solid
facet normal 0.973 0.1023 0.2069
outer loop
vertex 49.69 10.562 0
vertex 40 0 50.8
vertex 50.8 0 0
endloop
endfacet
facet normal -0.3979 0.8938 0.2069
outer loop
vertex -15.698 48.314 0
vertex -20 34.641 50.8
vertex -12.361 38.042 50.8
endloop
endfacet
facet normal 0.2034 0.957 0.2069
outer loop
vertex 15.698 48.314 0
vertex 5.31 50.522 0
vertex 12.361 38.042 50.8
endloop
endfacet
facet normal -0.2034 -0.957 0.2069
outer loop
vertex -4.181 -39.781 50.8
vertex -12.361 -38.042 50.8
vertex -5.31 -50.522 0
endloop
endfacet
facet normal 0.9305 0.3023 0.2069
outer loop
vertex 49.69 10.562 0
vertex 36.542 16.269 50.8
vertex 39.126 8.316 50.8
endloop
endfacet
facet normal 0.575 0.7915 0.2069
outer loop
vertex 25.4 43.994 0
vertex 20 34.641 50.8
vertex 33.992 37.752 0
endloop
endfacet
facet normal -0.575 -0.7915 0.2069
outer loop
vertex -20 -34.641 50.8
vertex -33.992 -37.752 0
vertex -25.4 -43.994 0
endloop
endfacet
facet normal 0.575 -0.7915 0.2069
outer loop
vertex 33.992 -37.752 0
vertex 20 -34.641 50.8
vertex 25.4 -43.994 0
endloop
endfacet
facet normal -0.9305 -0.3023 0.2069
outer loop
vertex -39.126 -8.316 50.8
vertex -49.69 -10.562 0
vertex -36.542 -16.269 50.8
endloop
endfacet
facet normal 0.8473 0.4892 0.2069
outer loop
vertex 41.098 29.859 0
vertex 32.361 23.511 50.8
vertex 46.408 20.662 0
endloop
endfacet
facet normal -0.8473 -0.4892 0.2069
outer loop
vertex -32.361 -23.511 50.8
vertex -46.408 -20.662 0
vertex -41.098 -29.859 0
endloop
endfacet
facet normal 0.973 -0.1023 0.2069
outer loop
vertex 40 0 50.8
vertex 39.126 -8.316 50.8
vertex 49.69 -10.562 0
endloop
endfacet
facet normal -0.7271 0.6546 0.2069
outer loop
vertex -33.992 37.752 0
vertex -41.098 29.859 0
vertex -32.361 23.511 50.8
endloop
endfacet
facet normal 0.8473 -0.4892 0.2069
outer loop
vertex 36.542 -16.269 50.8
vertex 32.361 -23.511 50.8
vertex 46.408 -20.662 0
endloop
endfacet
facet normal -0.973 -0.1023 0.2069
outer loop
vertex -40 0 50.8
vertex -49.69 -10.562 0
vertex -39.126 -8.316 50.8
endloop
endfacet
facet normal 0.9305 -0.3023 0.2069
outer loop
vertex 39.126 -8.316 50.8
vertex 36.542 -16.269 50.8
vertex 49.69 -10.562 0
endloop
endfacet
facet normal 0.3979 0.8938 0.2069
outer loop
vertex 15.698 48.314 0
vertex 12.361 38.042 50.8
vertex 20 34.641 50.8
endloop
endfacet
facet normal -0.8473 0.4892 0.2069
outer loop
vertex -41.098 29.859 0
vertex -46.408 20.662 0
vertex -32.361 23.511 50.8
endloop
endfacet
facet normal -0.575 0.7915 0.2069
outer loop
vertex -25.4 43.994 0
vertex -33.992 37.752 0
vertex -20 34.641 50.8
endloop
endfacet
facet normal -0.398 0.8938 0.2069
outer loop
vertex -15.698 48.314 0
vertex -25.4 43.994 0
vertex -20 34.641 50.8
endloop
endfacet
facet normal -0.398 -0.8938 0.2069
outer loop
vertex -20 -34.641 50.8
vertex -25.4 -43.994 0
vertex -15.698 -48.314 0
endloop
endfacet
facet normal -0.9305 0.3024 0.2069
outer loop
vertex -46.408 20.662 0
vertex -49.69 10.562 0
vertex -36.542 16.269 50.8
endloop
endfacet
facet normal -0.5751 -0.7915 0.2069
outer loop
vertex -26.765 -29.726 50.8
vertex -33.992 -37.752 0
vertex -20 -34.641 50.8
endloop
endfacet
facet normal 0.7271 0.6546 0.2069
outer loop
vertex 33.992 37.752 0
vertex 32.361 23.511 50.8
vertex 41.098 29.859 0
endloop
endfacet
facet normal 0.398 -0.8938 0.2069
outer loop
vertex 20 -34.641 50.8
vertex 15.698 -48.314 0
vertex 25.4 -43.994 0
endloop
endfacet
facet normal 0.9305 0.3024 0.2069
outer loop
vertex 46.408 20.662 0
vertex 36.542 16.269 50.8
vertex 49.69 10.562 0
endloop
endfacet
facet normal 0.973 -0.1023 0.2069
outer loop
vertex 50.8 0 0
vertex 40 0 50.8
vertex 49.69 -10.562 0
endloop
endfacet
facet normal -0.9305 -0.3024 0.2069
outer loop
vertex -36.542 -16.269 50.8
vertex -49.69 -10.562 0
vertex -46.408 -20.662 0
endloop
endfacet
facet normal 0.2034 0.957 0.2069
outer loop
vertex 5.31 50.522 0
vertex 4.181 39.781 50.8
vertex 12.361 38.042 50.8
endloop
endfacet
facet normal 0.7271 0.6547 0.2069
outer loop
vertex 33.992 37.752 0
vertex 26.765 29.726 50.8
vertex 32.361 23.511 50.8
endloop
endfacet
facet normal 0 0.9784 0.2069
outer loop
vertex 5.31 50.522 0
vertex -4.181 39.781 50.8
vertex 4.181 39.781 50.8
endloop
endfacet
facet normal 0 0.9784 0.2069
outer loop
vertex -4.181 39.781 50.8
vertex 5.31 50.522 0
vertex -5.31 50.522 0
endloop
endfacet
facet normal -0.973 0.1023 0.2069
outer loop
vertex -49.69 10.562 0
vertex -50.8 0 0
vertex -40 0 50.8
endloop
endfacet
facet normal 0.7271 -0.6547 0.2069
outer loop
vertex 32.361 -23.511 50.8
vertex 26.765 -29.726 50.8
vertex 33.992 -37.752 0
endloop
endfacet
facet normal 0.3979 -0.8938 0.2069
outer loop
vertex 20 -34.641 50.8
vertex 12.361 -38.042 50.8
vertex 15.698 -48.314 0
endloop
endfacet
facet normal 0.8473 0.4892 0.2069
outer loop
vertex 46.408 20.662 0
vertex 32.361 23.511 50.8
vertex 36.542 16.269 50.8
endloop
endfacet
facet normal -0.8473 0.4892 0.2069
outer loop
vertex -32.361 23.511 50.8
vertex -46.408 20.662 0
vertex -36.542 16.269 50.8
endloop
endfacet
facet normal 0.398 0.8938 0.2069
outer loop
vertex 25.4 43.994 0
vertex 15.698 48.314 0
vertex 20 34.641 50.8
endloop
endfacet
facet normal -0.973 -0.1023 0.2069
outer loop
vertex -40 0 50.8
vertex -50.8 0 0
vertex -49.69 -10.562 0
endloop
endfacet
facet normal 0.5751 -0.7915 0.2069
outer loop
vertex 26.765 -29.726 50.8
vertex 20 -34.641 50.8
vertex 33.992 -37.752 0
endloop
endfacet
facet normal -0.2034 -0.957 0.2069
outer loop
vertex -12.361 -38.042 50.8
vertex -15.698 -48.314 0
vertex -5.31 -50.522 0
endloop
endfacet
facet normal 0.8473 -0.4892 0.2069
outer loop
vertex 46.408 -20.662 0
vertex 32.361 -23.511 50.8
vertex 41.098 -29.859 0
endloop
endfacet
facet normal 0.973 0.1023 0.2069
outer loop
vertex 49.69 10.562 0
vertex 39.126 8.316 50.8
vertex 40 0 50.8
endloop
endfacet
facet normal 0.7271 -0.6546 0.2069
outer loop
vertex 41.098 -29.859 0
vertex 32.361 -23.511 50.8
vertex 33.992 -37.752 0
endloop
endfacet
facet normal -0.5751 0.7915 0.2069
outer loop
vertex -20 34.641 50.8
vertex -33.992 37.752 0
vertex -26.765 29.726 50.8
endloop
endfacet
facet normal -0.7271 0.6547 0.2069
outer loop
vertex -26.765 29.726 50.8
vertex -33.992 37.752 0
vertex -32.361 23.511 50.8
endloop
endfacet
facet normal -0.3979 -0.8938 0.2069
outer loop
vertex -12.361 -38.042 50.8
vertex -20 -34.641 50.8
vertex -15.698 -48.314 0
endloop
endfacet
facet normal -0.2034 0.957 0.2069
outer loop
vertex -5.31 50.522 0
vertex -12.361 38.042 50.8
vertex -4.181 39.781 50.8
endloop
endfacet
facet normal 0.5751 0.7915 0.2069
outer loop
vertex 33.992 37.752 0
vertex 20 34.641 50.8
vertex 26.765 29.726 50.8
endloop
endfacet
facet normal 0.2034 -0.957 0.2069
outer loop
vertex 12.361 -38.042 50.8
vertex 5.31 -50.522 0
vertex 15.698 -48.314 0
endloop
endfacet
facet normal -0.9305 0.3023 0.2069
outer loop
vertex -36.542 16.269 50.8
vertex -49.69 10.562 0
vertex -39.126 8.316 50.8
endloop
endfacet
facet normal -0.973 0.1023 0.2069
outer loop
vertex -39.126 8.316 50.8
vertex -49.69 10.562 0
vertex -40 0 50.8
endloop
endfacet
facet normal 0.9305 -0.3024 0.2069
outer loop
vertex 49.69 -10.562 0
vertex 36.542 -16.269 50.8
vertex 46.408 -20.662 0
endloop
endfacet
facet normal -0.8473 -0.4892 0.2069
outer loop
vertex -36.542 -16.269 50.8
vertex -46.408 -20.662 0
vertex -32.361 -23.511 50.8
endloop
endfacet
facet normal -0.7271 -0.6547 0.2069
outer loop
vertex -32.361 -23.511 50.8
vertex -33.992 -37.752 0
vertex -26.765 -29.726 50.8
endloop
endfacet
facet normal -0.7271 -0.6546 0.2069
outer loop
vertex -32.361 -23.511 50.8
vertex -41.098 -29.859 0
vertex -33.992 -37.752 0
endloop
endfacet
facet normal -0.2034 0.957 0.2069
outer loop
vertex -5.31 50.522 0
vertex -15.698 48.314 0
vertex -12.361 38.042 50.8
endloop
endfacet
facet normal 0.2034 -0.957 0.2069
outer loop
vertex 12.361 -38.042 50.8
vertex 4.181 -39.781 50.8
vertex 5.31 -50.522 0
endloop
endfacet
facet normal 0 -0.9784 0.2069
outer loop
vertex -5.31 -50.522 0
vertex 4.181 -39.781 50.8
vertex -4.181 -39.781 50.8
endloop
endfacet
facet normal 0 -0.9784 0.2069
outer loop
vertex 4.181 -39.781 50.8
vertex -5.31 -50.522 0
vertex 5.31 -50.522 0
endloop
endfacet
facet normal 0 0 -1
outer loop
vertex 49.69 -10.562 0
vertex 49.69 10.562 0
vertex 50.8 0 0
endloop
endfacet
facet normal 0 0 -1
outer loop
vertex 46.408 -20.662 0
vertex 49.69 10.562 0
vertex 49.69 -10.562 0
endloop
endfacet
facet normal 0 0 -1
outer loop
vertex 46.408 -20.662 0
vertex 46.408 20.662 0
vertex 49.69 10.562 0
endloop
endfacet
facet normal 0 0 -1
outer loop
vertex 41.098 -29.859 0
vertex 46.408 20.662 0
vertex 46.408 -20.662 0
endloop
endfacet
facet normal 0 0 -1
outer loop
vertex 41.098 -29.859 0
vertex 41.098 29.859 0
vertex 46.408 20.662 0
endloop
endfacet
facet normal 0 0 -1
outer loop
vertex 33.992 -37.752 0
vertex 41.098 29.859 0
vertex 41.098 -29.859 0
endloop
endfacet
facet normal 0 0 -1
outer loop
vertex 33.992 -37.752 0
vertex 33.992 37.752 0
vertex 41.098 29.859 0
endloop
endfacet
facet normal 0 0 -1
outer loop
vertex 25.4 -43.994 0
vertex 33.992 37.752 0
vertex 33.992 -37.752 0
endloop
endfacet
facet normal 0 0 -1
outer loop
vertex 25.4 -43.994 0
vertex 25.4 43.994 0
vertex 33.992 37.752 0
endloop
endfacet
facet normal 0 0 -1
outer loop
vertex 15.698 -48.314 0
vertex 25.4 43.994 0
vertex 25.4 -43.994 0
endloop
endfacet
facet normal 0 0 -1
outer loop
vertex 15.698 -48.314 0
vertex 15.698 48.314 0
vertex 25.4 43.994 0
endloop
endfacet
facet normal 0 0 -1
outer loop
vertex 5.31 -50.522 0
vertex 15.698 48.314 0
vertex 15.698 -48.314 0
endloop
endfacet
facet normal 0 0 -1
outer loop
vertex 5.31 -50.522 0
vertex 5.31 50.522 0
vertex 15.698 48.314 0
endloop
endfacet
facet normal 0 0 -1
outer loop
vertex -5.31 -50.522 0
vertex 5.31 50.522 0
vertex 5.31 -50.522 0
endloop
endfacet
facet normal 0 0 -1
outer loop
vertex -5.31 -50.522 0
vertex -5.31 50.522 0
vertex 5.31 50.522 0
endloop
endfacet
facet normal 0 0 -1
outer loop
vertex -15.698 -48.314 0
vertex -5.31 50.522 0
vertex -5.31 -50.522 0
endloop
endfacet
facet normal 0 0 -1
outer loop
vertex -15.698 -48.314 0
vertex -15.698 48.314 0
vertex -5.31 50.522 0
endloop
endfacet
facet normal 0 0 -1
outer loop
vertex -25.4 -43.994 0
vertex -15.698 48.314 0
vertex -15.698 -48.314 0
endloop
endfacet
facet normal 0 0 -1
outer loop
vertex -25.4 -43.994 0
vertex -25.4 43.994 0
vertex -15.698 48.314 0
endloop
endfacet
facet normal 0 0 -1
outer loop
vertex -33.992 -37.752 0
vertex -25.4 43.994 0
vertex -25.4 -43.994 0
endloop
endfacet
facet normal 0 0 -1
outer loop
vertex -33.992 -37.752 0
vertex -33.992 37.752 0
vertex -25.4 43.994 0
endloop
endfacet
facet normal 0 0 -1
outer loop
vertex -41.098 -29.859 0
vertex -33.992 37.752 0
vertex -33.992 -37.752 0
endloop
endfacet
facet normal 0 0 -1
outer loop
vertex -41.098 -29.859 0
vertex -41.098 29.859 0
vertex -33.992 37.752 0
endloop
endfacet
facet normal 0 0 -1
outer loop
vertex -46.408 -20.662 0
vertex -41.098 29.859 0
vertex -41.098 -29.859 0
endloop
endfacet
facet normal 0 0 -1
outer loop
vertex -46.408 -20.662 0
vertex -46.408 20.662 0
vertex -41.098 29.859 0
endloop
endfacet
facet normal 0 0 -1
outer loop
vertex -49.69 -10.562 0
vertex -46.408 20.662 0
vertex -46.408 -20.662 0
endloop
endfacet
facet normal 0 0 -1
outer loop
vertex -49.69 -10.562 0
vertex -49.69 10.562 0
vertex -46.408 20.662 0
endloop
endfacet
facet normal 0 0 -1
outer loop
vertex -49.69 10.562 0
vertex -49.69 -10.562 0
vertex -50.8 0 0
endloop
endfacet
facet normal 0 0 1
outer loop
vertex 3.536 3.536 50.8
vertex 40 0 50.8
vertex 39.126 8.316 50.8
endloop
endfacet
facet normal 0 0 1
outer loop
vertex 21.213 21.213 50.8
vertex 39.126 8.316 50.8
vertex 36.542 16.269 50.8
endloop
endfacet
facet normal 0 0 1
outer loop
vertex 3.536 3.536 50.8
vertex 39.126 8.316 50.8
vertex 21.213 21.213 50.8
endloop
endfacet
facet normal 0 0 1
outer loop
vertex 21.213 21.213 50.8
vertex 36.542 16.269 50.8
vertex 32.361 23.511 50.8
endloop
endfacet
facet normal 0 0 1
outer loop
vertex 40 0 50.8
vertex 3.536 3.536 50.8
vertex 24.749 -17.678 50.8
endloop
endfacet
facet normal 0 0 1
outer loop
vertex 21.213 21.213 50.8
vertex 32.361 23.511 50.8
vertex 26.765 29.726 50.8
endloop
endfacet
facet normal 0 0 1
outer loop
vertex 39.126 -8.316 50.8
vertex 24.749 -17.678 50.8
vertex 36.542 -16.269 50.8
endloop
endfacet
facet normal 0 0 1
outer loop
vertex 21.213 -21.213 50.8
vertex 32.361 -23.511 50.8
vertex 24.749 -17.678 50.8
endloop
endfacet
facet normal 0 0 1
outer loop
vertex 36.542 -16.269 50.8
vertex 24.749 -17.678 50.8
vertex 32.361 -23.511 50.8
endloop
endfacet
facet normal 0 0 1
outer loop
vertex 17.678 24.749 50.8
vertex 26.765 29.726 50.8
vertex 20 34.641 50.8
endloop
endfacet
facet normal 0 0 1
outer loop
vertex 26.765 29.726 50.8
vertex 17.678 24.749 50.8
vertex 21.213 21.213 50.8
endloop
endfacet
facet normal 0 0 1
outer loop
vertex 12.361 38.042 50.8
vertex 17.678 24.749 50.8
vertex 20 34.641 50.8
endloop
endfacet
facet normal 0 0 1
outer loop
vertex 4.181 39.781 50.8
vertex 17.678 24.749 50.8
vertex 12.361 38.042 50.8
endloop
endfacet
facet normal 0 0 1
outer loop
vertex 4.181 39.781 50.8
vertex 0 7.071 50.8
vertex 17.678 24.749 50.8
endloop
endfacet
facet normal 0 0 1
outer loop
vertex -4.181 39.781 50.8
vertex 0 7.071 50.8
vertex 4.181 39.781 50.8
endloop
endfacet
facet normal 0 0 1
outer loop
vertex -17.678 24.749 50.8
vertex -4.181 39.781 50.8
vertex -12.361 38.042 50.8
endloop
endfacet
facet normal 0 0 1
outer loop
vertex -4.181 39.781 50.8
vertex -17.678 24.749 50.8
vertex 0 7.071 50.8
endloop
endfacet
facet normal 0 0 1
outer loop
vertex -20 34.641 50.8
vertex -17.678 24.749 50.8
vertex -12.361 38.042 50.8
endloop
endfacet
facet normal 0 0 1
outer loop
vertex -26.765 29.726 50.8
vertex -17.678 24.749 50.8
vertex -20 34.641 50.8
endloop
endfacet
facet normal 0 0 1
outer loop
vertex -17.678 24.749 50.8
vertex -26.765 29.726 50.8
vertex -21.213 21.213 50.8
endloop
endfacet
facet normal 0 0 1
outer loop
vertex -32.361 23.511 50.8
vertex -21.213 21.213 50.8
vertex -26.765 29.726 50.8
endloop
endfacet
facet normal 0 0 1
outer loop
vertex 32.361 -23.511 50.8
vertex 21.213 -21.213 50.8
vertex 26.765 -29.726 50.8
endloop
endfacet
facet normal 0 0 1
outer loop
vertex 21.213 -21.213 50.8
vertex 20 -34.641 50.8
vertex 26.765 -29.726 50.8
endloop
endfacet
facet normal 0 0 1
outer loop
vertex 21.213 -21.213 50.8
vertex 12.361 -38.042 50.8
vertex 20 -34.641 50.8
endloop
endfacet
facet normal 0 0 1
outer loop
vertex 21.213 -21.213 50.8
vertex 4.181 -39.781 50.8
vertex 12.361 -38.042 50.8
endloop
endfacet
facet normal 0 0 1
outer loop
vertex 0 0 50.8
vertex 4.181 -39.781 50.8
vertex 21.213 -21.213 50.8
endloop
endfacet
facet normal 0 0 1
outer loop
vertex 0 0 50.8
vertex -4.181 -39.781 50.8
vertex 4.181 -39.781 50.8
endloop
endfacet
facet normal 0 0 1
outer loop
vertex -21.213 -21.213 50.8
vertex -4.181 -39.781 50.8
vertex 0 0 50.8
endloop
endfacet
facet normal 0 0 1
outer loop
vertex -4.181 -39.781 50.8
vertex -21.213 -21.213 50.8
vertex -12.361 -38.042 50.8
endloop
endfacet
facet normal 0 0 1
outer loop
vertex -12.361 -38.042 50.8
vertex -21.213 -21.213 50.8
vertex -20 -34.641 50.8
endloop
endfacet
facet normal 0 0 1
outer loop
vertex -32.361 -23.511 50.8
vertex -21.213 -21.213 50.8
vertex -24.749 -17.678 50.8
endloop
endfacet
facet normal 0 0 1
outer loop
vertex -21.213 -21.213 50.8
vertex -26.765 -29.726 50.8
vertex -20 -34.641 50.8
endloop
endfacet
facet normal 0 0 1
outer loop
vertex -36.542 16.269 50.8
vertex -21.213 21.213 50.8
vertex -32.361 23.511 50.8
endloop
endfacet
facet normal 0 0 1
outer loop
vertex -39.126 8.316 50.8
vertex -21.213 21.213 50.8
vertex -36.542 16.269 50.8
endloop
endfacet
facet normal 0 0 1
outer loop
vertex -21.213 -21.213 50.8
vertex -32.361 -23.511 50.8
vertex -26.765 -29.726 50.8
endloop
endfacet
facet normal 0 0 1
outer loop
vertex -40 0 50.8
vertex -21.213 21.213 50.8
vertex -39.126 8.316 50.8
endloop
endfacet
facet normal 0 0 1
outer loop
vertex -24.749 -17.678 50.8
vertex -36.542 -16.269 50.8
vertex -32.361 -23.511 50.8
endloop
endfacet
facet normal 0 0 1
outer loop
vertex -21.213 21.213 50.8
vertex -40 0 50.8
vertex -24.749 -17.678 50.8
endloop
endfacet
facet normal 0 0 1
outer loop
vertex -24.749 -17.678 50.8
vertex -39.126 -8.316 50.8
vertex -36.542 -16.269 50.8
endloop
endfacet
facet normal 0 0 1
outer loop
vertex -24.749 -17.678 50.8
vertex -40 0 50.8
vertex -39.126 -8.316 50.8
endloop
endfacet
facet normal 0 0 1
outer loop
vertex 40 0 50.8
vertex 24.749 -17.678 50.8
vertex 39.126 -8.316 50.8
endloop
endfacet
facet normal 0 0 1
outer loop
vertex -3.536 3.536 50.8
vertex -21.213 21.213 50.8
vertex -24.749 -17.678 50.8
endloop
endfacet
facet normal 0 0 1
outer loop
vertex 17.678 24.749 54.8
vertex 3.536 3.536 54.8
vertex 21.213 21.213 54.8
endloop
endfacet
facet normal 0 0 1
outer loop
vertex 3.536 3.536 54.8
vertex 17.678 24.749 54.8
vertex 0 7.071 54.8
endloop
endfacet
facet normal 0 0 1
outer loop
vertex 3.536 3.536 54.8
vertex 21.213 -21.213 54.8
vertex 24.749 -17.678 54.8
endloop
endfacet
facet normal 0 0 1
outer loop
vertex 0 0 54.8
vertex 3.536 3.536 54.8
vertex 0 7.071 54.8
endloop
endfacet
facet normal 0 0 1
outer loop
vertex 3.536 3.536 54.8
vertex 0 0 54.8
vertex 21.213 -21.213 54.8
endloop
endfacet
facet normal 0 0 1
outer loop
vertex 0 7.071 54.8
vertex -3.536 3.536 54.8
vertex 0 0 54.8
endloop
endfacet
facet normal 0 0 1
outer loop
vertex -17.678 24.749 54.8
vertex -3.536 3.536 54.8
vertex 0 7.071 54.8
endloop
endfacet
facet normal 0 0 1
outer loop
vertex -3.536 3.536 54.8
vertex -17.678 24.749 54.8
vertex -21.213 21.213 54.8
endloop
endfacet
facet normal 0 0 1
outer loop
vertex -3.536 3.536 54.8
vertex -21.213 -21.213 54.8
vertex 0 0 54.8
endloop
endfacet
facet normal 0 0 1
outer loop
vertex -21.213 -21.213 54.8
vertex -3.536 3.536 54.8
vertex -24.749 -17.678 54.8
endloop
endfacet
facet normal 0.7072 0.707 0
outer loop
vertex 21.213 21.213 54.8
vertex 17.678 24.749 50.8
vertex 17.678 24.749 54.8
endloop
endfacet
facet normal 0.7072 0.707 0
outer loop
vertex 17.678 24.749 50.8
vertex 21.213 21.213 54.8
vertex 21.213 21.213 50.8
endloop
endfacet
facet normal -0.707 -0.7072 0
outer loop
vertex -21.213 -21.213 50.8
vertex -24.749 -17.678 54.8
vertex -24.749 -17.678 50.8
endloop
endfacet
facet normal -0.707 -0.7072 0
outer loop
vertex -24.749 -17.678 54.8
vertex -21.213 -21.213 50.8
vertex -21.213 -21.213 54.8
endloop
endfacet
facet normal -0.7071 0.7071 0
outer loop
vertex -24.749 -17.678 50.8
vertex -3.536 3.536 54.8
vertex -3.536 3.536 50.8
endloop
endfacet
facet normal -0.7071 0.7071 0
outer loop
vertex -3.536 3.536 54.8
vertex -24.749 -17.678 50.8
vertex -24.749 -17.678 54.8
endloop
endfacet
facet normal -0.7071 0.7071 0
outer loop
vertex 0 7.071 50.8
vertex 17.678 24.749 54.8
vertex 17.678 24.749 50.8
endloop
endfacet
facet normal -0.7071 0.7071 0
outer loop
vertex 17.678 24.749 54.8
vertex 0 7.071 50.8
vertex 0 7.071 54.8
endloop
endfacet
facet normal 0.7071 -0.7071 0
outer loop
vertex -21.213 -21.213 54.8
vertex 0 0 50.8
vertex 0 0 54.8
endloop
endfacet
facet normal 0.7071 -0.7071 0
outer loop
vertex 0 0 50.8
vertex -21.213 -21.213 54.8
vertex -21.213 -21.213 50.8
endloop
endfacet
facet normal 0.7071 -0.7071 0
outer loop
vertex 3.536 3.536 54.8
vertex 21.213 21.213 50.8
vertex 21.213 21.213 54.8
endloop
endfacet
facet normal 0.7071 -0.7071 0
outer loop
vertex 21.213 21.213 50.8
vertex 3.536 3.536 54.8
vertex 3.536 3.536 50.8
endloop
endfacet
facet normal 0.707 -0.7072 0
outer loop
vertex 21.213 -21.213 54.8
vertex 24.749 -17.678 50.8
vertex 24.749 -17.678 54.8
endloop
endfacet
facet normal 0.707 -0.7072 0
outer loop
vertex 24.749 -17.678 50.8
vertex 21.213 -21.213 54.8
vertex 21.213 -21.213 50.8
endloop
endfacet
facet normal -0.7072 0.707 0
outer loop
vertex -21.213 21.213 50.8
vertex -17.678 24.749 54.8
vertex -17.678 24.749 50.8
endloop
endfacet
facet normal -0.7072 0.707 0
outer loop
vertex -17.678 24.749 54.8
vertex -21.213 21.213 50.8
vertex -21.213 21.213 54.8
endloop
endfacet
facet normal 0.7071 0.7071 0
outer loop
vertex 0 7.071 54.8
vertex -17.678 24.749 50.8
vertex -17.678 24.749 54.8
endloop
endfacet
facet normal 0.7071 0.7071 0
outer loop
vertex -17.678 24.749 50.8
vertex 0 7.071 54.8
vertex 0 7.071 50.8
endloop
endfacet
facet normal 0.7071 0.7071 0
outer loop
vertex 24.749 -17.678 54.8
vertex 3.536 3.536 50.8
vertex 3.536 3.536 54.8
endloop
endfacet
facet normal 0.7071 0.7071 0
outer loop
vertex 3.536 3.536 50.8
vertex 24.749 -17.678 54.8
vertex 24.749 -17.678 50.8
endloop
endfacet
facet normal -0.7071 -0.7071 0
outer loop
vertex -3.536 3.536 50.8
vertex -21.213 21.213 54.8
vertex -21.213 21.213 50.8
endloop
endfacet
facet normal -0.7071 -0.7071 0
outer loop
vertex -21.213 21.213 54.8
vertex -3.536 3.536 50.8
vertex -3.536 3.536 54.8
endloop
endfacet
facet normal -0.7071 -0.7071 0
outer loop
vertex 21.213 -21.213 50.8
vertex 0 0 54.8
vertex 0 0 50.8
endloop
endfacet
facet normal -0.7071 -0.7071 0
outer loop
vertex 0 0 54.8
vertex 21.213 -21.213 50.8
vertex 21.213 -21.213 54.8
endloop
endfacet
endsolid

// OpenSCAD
union() {
cylinder(h=50.8,r1=50.8,r2=40);
rotate([0,0,45]) translate([-30,0,50.8]) cube([60,5,4]);
rotate([0,0,-45]) translate([-30,0,50.8]) cube([60,5,4]);
}
